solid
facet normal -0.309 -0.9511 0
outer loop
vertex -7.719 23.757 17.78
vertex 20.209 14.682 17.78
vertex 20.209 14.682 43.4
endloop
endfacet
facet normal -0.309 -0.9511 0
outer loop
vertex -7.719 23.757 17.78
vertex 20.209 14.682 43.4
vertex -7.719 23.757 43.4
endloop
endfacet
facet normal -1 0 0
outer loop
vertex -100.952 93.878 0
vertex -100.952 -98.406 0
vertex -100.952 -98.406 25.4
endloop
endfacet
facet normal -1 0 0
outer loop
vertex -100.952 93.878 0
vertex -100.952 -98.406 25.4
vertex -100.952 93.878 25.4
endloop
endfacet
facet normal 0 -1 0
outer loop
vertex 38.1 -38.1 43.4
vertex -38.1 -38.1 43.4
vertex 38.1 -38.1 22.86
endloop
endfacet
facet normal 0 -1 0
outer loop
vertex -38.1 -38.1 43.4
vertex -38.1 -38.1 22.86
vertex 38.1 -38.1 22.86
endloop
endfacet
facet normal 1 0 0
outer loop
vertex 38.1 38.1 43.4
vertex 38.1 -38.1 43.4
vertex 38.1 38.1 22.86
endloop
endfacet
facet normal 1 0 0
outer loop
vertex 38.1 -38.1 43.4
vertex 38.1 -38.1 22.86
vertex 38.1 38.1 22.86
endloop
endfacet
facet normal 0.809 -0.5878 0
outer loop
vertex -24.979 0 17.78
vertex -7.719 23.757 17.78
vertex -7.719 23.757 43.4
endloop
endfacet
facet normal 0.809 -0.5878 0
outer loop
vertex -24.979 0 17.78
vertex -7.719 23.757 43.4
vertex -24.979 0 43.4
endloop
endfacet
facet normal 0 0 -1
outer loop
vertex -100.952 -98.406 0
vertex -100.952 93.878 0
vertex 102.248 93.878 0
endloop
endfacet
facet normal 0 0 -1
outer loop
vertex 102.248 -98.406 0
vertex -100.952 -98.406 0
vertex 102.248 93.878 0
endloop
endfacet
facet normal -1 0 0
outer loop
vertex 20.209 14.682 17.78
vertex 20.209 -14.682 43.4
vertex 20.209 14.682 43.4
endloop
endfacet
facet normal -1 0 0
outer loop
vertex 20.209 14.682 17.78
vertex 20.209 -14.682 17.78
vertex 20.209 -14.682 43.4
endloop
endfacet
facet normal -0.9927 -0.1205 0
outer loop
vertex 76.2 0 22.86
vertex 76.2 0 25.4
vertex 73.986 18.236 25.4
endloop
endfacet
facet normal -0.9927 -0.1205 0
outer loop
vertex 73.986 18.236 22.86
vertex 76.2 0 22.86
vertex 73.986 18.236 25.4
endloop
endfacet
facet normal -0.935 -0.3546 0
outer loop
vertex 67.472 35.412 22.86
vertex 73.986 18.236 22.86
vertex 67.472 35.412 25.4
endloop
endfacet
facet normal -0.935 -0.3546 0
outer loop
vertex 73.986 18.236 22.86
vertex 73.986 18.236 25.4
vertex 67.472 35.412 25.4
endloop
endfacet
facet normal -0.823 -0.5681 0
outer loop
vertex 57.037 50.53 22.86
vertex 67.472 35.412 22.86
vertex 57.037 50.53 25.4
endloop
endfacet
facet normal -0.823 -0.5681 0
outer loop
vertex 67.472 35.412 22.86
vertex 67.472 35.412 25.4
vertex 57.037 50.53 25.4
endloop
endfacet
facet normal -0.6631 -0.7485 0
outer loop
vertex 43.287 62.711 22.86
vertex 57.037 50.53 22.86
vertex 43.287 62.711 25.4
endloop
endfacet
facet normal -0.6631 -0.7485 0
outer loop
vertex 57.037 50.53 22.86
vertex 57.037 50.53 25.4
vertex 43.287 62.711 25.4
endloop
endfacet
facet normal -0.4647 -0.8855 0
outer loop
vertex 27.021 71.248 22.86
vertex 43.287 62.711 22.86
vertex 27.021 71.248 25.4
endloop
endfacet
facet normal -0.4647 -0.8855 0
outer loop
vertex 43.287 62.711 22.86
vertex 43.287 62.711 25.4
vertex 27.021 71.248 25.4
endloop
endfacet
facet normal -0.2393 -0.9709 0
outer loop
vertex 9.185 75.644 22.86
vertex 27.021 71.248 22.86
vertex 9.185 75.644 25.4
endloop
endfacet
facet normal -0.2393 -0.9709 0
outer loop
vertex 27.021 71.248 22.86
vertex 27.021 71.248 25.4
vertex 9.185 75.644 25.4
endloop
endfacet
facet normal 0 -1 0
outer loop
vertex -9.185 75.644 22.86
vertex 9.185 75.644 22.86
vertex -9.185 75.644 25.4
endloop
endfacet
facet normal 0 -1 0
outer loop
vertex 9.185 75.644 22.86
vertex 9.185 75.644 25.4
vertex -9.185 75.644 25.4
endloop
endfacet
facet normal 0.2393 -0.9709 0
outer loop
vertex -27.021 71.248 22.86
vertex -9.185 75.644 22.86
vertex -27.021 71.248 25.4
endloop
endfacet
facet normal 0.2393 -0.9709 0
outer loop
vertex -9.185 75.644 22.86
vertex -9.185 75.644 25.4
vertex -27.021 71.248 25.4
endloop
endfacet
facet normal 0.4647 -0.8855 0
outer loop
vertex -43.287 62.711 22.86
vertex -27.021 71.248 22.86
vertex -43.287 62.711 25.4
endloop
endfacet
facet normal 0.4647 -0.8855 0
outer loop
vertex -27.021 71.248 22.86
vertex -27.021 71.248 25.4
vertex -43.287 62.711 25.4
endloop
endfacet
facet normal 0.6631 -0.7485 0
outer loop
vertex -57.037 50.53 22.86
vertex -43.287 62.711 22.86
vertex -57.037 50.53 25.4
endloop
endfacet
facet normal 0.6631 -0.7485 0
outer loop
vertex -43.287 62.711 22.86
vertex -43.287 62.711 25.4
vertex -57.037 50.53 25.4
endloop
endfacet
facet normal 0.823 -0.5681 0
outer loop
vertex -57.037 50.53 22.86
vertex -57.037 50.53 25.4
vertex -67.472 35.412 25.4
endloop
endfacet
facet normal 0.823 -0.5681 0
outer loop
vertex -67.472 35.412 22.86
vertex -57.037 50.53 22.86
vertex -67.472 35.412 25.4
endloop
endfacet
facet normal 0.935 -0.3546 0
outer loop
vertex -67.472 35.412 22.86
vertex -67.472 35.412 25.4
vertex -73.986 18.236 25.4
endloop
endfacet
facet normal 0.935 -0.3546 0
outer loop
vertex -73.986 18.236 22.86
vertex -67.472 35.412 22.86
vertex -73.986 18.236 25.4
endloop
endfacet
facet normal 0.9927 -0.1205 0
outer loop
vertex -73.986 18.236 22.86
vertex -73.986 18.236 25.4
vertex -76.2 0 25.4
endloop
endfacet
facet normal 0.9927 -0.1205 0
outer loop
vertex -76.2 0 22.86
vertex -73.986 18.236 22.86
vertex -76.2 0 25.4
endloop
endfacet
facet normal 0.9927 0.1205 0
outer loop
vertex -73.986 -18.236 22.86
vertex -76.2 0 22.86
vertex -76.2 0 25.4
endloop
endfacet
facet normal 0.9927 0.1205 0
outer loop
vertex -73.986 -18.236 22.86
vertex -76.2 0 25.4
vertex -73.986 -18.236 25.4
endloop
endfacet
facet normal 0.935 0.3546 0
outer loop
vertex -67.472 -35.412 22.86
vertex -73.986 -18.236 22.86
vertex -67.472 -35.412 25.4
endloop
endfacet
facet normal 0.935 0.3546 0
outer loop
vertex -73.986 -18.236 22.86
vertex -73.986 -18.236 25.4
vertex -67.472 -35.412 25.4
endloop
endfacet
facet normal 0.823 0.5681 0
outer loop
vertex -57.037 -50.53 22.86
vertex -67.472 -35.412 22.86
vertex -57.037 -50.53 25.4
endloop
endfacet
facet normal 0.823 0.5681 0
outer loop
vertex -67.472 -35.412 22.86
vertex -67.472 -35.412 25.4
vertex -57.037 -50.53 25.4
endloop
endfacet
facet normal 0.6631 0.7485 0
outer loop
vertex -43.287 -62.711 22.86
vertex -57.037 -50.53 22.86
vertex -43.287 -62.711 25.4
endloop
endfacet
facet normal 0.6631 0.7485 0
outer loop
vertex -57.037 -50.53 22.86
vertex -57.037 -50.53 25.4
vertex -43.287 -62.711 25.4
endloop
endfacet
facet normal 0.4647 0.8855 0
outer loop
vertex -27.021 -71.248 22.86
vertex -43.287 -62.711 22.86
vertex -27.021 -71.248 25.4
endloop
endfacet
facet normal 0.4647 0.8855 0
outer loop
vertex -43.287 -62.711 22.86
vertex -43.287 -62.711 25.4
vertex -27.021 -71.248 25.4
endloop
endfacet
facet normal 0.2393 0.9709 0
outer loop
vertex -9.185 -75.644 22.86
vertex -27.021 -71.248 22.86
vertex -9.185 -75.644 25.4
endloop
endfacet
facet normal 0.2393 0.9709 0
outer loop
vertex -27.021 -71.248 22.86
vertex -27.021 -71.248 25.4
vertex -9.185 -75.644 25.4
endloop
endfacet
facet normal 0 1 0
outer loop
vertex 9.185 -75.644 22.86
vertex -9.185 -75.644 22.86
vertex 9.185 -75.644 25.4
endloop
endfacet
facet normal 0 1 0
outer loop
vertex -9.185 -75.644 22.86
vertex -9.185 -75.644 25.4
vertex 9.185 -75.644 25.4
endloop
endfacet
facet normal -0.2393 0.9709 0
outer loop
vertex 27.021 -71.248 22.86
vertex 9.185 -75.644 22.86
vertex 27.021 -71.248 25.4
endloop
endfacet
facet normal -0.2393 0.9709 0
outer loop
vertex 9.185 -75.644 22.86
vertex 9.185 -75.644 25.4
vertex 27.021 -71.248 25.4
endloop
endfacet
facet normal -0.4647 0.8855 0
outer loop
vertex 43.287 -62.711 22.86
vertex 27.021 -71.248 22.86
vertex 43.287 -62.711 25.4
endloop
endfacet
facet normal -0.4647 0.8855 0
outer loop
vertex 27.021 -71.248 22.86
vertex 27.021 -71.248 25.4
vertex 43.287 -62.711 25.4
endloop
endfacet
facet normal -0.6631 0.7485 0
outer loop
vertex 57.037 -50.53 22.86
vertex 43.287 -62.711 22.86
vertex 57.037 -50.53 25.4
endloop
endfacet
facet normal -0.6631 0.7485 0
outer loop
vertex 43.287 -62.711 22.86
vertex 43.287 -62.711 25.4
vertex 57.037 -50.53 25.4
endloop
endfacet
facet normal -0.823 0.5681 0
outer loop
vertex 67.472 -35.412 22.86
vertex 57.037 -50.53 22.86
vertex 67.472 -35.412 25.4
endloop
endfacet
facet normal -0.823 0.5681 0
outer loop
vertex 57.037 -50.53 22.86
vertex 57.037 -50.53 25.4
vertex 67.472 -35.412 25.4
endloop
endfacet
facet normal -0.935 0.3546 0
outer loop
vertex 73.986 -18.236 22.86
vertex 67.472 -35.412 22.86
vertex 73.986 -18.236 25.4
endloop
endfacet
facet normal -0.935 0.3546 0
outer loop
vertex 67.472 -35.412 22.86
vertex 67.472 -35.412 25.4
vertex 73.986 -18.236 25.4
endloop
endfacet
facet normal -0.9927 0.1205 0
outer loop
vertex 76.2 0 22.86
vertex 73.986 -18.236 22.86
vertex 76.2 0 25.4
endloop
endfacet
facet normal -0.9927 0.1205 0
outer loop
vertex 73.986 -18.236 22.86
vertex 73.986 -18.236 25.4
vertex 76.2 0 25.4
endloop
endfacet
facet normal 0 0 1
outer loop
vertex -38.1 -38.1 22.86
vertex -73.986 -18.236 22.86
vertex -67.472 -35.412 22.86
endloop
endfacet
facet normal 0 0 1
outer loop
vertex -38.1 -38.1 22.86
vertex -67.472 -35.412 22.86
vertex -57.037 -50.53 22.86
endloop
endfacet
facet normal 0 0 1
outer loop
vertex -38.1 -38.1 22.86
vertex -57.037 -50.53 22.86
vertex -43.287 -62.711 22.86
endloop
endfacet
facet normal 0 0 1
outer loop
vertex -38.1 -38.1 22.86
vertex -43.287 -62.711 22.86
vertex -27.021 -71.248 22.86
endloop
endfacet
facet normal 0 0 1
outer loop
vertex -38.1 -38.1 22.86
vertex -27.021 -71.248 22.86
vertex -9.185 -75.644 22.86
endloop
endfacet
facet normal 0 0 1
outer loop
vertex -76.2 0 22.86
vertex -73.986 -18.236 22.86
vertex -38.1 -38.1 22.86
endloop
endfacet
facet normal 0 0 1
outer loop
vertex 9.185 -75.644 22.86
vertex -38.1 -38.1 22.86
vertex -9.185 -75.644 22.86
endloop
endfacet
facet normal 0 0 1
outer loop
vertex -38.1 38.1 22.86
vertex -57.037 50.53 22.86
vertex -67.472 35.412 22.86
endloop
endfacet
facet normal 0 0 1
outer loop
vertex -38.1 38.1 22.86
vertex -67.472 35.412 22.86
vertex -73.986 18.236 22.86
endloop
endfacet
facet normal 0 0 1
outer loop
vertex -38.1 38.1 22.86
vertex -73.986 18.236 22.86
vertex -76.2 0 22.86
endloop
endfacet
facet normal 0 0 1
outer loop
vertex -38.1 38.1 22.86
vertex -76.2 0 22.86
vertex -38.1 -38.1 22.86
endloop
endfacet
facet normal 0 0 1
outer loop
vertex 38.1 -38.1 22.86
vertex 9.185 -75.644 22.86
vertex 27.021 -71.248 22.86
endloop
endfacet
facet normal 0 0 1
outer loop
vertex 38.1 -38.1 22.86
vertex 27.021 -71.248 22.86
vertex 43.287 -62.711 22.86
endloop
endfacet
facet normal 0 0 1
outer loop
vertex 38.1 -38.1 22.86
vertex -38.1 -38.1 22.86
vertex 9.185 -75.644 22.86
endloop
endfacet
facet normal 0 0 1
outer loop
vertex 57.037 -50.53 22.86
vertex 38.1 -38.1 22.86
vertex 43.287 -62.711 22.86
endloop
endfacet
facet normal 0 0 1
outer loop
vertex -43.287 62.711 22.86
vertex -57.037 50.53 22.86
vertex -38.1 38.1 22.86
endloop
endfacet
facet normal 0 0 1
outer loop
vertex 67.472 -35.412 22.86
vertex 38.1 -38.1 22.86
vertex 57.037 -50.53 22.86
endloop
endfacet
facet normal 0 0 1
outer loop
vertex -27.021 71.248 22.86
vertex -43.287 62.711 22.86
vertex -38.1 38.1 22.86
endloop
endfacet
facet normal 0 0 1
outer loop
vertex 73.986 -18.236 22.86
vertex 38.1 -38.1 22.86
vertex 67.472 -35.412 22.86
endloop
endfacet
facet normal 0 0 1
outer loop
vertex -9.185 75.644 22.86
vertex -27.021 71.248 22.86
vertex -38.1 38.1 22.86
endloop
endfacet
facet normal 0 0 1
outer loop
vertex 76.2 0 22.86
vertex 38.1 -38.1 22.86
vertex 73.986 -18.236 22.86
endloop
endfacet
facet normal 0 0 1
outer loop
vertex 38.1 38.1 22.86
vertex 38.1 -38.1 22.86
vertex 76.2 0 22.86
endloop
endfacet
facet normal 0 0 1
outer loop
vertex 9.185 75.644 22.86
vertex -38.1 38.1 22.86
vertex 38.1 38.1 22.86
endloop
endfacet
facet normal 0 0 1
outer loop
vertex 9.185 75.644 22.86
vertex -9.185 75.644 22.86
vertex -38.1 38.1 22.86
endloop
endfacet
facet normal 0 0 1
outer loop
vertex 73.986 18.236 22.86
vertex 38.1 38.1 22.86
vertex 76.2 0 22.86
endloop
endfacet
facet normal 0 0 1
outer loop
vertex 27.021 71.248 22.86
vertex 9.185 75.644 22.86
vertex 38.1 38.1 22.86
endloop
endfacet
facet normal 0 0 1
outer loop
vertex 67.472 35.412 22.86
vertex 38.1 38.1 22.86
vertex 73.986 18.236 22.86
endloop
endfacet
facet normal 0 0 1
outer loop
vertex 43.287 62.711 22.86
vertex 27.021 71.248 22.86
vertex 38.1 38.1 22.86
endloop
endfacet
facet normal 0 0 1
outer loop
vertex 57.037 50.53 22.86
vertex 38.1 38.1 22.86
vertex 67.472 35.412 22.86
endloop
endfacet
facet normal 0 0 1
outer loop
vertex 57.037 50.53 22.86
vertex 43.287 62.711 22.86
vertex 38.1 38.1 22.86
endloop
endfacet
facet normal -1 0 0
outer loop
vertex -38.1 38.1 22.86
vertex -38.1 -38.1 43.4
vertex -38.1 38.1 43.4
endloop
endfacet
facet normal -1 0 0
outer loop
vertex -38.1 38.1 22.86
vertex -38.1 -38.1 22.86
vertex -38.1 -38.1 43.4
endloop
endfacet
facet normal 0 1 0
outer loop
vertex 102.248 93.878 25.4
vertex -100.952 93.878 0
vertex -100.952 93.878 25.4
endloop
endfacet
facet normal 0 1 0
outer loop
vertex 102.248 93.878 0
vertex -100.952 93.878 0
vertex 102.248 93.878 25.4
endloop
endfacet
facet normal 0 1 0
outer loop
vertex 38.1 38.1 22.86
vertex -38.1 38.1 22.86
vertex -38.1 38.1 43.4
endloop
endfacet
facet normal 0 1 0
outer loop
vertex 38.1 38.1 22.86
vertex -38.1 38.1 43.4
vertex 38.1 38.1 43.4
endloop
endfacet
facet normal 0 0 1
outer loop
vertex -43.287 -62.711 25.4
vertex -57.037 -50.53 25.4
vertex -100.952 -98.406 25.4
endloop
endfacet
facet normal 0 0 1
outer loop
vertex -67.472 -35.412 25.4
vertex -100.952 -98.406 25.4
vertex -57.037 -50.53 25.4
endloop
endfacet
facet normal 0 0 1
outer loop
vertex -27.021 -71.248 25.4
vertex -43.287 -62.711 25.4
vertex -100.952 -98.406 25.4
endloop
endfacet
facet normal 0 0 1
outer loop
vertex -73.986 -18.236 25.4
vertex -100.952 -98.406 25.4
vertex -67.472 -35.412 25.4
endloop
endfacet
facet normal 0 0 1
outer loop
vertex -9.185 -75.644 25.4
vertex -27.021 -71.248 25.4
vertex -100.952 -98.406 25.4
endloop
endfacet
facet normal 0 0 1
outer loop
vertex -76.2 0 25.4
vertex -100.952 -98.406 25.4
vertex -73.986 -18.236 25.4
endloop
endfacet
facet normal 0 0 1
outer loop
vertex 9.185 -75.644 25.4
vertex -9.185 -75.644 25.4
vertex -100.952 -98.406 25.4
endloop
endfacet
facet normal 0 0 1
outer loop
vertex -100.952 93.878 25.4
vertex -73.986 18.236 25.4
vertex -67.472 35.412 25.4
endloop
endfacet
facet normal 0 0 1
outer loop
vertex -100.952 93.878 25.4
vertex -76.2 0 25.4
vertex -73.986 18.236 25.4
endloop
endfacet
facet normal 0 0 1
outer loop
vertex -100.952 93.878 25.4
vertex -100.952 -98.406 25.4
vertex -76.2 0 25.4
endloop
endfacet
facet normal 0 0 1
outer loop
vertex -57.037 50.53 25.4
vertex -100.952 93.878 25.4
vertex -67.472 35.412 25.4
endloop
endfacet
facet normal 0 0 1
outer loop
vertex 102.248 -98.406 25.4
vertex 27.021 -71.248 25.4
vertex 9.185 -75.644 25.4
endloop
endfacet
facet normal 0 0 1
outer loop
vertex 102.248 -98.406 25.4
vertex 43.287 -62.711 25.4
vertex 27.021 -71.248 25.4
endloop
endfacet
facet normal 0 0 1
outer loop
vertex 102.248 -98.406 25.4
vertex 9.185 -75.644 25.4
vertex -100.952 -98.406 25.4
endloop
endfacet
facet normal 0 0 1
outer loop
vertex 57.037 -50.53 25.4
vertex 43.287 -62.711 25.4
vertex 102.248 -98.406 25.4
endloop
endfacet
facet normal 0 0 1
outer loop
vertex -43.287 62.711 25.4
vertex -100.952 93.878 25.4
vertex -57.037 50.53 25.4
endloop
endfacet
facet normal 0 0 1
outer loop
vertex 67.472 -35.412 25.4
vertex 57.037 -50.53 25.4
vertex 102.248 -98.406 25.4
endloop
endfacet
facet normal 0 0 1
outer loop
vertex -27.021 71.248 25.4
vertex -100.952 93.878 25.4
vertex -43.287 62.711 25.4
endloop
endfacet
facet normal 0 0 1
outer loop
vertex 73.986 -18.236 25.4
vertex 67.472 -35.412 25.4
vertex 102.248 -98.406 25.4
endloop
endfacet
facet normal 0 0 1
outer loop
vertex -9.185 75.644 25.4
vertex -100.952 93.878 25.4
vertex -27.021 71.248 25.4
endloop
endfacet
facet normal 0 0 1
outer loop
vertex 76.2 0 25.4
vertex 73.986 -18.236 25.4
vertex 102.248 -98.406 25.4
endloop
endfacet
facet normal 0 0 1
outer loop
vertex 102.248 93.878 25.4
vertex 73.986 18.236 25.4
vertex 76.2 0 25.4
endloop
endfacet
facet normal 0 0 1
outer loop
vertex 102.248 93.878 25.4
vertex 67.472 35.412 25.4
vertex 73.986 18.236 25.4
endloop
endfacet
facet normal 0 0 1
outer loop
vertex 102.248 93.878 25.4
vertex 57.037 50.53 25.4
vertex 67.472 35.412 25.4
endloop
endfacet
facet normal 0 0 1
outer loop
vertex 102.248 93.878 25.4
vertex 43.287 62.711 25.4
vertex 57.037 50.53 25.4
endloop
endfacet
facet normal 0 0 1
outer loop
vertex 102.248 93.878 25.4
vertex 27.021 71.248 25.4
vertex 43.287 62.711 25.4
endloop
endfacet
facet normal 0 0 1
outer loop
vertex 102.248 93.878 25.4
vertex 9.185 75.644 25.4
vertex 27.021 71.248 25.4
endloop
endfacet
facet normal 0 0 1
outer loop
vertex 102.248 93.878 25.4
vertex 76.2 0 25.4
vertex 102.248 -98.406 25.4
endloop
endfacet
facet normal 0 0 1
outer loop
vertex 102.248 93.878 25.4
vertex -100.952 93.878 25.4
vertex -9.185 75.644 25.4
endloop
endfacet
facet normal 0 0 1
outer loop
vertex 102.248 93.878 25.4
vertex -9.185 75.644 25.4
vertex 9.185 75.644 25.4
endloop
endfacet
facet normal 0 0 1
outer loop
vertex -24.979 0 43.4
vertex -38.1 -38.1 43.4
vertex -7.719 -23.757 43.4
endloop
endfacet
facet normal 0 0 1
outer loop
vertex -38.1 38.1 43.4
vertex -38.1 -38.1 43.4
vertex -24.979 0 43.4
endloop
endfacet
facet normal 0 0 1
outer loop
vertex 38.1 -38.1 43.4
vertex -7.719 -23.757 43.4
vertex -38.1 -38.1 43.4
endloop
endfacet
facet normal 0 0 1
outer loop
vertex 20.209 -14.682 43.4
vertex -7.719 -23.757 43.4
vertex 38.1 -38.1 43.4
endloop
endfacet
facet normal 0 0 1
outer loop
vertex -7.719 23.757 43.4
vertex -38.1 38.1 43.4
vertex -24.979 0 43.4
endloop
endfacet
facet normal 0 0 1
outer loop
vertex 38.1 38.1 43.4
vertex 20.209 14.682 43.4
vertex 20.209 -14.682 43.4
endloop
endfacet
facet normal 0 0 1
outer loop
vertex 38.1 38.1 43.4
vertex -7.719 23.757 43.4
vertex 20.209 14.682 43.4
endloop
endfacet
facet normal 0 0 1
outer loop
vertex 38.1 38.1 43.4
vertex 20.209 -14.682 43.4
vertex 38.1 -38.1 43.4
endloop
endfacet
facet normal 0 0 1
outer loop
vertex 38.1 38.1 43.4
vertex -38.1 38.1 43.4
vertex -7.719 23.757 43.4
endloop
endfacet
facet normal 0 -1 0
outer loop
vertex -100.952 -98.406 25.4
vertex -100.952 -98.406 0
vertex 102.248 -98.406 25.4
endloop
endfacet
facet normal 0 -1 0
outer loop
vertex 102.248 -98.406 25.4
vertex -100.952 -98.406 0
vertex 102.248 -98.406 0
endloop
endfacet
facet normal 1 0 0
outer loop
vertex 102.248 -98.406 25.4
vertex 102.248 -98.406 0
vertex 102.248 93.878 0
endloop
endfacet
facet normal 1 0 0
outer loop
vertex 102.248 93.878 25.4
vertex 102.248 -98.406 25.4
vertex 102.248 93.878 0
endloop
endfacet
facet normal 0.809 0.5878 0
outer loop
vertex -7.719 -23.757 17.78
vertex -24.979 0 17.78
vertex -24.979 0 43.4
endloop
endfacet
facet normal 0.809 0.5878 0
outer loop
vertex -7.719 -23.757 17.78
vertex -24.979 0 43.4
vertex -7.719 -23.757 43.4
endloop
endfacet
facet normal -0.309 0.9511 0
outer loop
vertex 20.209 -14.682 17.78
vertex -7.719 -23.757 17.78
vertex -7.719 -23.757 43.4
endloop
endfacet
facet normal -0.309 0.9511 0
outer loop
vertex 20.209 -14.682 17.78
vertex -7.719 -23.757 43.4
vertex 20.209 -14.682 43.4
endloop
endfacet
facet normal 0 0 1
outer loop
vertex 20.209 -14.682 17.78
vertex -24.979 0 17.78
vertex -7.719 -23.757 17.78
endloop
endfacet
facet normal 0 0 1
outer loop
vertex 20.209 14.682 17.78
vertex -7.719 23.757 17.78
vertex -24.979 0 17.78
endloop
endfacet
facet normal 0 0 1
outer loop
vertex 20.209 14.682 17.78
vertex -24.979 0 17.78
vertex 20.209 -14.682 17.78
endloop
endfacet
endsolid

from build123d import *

# Parameters (mm, degrees)
F0_W     = 203.2
F0_H     = 192.284051628
F1_DEPTH = 25.4
F2_R     = 76.2
F3_DEPTH = 2.54
F4_W     = 76.2
F4_H     = 76.2
F5_DEPTH = 2.54
F7_DEPTH = 7.62
F8_DEPTH = 18


with BuildPart() as f1:
    # F0 (on Top) → F1 (new body)
    with BuildSketch(Plane.XY):
        with Locations((0.6476622075, -2.2640712559)):
            Rectangle(F0_W, F0_H)
    extrude(amount=F1_DEPTH)

    # F2 (on face) → F3 (cut)
    with BuildSketch(Plane.XY.offset(25.4)):
        Circle(F2_R)
    extrude(amount=-F3_DEPTH, mode=Mode.SUBTRACT)

    # F4 (on face) → F5 (join)
    with BuildSketch(Plane.XY.offset(22.86)):
        Rectangle(F4_W, F4_H)
    extrude(amount=F5_DEPTH)

    # F6 (on face) → F7 (cut)
    with BuildSketch(Plane.XY.offset(25.4)):
        Polygon((20.2086176723, -14.6824201711), (20.2086176723, 14.6824201711), (-7.7190050852, 23.756654874), (-24.9792251743, 0), (-7.7190050852, -23.756654874), align=None)
    extrude(amount=-F7_DEPTH, mode=Mode.SUBTRACT)

    # F8 (add): a face of the model
    f8_faces = [f1.faces().sort_by_distance(p)[0] for p in [
        (0, 37.0223692655, 25.4),
    ]]
    extrude(f8_faces, amount=F8_DEPTH)


solid = f1.part
